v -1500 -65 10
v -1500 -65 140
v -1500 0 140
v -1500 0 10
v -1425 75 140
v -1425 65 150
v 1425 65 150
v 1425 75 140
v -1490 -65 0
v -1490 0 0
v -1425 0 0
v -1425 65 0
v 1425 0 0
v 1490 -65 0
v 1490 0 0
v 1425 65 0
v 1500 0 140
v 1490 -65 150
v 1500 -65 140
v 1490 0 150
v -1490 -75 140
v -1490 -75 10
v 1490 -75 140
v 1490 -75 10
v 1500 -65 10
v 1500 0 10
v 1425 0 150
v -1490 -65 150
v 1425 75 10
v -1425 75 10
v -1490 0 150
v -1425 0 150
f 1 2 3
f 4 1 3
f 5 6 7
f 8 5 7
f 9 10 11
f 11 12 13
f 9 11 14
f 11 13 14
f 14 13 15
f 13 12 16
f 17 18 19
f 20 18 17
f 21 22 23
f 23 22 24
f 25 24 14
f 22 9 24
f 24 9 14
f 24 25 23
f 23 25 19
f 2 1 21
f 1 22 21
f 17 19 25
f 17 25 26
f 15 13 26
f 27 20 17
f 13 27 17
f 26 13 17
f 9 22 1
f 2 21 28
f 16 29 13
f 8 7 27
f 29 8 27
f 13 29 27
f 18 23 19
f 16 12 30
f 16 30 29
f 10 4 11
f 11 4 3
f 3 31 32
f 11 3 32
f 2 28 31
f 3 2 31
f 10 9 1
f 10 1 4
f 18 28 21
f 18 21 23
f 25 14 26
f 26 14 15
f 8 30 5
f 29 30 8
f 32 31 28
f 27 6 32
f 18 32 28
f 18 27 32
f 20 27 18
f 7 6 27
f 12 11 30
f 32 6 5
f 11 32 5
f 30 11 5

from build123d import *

# Parameters (mm, degrees)
F0_W     = 3000
F0_H     = 150
F1_DEPTH = 150
F2_SIZE  = 10
F3_W     = 65
F3_H     = 65
F4_DEPTH = 150.001
F5_W     = 65
F5_H     = 65
F6_DEPTH = 150.001


with BuildPart() as f1:
    # F0 (on Top) → F1 (new body)
    with BuildSketch(Plane.XY):
        Rectangle(F0_W, F0_H)
    extrude(amount=F1_DEPTH)

    # F2
    f2_edges = [f1.edges().sort_by_distance(p)[0] for p in [
        (-1500, -75, 75),
        (1500, -75, 75),
        (0, -75, 0),
        (0, -75, 150),
        (0, 75, 150),
        (-1500, 0, 150),
        (1500, 0, 150),
        (-1500, 75, 75),
        (-1500, 0, 0),
        (0, 75, 0),
        (1500, 0, 0),
        (1500, 75, 75),
    ]]
    chamfer(f2_edges, length=F2_SIZE)

    # F3 (on face) → F4 (cut, through all)
    with BuildSketch(Plane.XY.offset(150)):
        with Locations((-1457.5, 32.5)):
            Rectangle(F3_W, F3_H)
        Polygon((-1425, 65), (-1425, 75), (-1500, 75), (-1500, 0), (-1490, 0), (-1490, 65), align=None)
    extrude(amount=-F4_DEPTH, mode=Mode.SUBTRACT)

    # F5 (on face) → F6 (cut, through all)
    with BuildSketch(Plane.XY.offset(150)):
        Polygon((1500, 75), (1425, 75), (1425, 65), (1490, 65), (1490, 0), (1500, 0), align=None)
        with Locations((1457.5, 32.5)):
            Rectangle(F5_W, F5_H)
    extrude(amount=-F6_DEPTH, mode=Mode.SUBTRACT)


solid = f1.part
